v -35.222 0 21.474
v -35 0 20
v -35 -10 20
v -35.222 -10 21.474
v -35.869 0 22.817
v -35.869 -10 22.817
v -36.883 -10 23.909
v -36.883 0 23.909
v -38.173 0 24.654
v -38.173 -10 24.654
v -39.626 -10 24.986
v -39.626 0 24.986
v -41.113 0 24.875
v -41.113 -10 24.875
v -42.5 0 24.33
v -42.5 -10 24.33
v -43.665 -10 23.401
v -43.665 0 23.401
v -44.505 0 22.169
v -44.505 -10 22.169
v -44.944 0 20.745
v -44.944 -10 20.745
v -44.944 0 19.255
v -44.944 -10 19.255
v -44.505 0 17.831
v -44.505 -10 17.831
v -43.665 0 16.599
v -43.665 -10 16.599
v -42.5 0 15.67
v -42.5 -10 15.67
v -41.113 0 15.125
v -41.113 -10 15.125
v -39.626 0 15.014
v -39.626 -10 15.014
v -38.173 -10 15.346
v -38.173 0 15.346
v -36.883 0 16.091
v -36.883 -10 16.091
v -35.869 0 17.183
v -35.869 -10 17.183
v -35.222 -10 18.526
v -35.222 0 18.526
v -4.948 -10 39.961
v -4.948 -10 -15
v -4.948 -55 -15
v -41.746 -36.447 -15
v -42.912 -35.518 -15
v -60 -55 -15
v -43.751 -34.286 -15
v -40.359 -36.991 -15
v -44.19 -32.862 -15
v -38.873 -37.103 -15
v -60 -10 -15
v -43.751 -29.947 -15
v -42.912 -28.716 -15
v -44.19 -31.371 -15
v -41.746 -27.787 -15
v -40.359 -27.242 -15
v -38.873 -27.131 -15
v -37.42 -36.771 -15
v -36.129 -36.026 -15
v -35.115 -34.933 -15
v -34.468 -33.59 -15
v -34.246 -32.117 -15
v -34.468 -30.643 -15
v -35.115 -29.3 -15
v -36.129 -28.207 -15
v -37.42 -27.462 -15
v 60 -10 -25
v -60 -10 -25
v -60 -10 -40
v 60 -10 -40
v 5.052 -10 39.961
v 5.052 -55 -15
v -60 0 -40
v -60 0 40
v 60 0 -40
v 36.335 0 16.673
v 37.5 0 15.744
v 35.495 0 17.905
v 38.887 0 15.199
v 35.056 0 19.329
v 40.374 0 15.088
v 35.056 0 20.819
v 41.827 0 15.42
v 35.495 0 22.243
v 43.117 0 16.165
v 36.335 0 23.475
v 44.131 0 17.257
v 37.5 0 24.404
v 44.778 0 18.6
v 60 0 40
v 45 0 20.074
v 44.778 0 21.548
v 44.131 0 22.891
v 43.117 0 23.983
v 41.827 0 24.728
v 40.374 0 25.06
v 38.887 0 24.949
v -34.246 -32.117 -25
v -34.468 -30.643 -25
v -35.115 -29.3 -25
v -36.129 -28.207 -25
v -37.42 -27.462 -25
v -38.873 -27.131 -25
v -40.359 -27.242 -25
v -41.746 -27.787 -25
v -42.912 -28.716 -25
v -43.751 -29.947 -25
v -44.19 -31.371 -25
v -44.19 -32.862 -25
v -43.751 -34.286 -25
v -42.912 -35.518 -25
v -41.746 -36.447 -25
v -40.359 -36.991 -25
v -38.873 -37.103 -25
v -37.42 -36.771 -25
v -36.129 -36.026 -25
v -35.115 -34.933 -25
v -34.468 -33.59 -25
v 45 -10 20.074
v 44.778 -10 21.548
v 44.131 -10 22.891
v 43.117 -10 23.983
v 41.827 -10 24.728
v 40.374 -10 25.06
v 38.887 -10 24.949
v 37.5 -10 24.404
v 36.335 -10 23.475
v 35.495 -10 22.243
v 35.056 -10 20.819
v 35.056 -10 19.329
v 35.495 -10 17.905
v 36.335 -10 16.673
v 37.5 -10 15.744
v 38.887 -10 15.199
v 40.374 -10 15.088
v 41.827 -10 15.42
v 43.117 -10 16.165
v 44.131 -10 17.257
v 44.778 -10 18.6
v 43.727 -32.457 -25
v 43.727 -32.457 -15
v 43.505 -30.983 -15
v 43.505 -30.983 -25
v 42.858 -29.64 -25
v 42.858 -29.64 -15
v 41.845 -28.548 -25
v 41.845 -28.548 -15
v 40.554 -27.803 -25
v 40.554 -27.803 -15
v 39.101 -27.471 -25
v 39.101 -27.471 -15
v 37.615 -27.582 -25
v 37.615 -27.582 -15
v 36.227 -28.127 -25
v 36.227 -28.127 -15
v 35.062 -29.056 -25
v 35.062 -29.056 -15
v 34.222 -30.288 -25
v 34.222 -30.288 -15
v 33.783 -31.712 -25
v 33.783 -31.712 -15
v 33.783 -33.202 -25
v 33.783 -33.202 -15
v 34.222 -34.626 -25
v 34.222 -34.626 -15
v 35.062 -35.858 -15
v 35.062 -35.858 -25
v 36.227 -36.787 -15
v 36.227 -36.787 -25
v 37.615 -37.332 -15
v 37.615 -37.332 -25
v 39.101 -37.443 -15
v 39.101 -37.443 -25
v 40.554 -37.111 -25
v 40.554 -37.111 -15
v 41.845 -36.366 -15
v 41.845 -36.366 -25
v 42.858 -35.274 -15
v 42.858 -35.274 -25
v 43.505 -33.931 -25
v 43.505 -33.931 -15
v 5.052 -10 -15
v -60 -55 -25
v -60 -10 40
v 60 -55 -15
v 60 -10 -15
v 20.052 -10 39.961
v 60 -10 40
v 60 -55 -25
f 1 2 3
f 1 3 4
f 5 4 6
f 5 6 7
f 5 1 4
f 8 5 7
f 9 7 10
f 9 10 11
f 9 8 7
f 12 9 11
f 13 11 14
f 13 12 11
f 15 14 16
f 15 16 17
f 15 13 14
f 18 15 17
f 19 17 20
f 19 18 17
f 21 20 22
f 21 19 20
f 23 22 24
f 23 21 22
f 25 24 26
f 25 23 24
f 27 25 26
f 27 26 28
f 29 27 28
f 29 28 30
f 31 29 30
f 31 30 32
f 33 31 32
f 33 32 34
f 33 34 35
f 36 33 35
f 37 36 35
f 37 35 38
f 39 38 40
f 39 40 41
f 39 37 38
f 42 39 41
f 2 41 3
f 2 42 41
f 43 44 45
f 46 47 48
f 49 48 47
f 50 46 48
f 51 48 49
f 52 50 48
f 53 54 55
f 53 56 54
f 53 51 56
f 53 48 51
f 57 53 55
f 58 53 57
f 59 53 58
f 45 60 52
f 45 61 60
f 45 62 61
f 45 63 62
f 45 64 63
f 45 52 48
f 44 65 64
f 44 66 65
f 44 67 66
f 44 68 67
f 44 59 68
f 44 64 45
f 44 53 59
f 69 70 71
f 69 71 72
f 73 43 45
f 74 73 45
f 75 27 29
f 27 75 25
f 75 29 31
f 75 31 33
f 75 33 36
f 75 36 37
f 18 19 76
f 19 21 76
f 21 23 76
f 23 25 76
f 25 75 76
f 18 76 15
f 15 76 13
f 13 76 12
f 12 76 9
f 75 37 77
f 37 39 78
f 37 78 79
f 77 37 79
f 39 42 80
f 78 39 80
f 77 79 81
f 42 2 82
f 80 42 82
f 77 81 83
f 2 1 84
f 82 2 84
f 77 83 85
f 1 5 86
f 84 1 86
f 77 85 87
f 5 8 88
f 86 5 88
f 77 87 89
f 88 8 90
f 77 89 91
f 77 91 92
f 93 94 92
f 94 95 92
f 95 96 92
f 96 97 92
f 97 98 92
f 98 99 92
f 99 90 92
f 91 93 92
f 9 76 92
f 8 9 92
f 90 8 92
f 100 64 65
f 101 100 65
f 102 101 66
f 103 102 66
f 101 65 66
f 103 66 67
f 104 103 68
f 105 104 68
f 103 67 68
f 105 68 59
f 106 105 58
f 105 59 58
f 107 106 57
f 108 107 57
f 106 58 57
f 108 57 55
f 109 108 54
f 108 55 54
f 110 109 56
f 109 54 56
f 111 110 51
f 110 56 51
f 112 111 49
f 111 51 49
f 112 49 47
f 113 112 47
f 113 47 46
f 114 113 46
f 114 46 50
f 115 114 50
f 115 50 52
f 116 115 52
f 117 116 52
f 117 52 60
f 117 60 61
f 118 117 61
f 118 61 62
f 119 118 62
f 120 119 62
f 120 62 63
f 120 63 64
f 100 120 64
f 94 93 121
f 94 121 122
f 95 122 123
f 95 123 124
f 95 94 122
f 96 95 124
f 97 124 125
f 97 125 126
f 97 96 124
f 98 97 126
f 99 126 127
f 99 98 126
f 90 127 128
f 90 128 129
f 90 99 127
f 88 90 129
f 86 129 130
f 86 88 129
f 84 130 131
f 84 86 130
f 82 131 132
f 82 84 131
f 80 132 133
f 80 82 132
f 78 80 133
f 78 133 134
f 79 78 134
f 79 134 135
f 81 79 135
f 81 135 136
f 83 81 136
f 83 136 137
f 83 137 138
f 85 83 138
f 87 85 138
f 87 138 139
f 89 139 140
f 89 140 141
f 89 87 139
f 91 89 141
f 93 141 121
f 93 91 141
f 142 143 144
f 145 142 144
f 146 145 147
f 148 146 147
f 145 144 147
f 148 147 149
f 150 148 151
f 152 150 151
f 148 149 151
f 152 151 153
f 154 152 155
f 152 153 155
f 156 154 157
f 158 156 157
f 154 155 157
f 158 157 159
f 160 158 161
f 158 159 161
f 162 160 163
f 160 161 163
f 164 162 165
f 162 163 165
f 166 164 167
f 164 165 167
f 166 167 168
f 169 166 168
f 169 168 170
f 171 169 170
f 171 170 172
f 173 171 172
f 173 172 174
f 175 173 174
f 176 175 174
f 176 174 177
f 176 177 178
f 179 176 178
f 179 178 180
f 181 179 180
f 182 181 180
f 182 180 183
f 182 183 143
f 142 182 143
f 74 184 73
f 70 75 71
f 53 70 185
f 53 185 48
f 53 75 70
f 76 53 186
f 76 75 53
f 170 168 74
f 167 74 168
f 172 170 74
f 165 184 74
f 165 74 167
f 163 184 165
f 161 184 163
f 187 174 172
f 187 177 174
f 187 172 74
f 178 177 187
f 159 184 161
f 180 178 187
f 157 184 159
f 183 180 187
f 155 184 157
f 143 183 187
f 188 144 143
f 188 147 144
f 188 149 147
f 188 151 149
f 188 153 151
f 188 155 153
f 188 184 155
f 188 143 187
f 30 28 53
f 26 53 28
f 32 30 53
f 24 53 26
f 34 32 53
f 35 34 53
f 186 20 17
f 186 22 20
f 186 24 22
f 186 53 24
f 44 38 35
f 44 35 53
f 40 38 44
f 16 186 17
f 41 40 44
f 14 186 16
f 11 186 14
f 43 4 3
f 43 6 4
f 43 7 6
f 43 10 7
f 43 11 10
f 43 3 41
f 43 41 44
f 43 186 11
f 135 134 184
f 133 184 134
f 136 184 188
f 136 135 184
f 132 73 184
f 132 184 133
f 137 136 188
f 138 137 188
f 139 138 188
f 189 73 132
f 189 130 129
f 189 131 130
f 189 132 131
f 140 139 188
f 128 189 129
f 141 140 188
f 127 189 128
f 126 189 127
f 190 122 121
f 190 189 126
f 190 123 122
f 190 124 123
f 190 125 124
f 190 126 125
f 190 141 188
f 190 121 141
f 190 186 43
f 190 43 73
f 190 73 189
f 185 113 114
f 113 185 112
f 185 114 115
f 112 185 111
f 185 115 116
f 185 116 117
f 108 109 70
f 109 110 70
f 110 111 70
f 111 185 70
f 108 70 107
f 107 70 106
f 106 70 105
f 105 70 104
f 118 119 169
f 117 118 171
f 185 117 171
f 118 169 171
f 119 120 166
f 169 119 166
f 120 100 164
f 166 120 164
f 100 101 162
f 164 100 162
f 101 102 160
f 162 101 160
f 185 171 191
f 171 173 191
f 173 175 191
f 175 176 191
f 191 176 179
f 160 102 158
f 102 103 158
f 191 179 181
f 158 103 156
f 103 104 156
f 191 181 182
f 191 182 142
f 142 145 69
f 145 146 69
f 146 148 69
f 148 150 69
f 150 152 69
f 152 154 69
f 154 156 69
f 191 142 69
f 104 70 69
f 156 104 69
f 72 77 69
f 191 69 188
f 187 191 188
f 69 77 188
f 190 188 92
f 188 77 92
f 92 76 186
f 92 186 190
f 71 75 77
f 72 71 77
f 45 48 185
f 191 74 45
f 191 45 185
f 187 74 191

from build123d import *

# Parameters (mm, degrees)
F0_W     = 120
F0_H     = 80
F0_R     = 5
F1_DEPTH = 10
F2_W     = 120
F2_H     = 10
F3_DEPTH = 45
F4_R     = 5
F5_DEPTH = 25
F6_W     = 10
F6_H     = 54.9613343179
F7_DEPTH = 45
F9_DEPTH = 25


# Not quite as in the source:
# - a feature names something its author has since deleted; it is built from what else it names


with BuildPart() as f1:
    # F0 (on Front) → F1 (new body)
    with BuildSketch(Plane.XZ):
        Rectangle(F0_W, F0_H)
        with Locations((-40, 20)):
            Circle(F0_R, mode=Mode.SUBTRACT)
        with Locations((40, 20.0739782304)):
            Circle(F0_R, mode=Mode.SUBTRACT)
    extrude(amount=F1_DEPTH)

    # F2 (on face) → F3 (join)
    with BuildSketch(Plane.XZ.offset(10)):
        with Locations((0, -20)):
            Rectangle(F2_W, F2_H)
    extrude(amount=F3_DEPTH)

    # F4 (on face) → F5 (cut)
    with BuildSketch(Plane.XY.offset(-15)):
        with Locations((-39.2463095486, -32.116651535)):
            Circle(F4_R)
        with Locations((38.7271312058, -32.4570691816)):
            Circle(F4_R)
    extrude(amount=-F5_DEPTH, mode=Mode.SUBTRACT)

    # F6 (on face) → F7 (join)
    with BuildSketch(Plane.XZ.offset(10)):
        with Locations((0.0515476614, 12.480667159)):
            Rectangle(F6_W, F6_H)
    extrude(amount=F7_DEPTH)

    # F8 (on face) → F9 (cut)
    with BuildSketch(Plane(origin=(-4.9484523386, 0, 0), x_dir=(0, -1, 0), z_dir=(-1, 0, 0))):
        Polygon((55, 39.9613343179), (10, 39.9613343179), (55, -15), align=None)
    extrude(amount=-F9_DEPTH, mode=Mode.SUBTRACT)


solid = f1.part
